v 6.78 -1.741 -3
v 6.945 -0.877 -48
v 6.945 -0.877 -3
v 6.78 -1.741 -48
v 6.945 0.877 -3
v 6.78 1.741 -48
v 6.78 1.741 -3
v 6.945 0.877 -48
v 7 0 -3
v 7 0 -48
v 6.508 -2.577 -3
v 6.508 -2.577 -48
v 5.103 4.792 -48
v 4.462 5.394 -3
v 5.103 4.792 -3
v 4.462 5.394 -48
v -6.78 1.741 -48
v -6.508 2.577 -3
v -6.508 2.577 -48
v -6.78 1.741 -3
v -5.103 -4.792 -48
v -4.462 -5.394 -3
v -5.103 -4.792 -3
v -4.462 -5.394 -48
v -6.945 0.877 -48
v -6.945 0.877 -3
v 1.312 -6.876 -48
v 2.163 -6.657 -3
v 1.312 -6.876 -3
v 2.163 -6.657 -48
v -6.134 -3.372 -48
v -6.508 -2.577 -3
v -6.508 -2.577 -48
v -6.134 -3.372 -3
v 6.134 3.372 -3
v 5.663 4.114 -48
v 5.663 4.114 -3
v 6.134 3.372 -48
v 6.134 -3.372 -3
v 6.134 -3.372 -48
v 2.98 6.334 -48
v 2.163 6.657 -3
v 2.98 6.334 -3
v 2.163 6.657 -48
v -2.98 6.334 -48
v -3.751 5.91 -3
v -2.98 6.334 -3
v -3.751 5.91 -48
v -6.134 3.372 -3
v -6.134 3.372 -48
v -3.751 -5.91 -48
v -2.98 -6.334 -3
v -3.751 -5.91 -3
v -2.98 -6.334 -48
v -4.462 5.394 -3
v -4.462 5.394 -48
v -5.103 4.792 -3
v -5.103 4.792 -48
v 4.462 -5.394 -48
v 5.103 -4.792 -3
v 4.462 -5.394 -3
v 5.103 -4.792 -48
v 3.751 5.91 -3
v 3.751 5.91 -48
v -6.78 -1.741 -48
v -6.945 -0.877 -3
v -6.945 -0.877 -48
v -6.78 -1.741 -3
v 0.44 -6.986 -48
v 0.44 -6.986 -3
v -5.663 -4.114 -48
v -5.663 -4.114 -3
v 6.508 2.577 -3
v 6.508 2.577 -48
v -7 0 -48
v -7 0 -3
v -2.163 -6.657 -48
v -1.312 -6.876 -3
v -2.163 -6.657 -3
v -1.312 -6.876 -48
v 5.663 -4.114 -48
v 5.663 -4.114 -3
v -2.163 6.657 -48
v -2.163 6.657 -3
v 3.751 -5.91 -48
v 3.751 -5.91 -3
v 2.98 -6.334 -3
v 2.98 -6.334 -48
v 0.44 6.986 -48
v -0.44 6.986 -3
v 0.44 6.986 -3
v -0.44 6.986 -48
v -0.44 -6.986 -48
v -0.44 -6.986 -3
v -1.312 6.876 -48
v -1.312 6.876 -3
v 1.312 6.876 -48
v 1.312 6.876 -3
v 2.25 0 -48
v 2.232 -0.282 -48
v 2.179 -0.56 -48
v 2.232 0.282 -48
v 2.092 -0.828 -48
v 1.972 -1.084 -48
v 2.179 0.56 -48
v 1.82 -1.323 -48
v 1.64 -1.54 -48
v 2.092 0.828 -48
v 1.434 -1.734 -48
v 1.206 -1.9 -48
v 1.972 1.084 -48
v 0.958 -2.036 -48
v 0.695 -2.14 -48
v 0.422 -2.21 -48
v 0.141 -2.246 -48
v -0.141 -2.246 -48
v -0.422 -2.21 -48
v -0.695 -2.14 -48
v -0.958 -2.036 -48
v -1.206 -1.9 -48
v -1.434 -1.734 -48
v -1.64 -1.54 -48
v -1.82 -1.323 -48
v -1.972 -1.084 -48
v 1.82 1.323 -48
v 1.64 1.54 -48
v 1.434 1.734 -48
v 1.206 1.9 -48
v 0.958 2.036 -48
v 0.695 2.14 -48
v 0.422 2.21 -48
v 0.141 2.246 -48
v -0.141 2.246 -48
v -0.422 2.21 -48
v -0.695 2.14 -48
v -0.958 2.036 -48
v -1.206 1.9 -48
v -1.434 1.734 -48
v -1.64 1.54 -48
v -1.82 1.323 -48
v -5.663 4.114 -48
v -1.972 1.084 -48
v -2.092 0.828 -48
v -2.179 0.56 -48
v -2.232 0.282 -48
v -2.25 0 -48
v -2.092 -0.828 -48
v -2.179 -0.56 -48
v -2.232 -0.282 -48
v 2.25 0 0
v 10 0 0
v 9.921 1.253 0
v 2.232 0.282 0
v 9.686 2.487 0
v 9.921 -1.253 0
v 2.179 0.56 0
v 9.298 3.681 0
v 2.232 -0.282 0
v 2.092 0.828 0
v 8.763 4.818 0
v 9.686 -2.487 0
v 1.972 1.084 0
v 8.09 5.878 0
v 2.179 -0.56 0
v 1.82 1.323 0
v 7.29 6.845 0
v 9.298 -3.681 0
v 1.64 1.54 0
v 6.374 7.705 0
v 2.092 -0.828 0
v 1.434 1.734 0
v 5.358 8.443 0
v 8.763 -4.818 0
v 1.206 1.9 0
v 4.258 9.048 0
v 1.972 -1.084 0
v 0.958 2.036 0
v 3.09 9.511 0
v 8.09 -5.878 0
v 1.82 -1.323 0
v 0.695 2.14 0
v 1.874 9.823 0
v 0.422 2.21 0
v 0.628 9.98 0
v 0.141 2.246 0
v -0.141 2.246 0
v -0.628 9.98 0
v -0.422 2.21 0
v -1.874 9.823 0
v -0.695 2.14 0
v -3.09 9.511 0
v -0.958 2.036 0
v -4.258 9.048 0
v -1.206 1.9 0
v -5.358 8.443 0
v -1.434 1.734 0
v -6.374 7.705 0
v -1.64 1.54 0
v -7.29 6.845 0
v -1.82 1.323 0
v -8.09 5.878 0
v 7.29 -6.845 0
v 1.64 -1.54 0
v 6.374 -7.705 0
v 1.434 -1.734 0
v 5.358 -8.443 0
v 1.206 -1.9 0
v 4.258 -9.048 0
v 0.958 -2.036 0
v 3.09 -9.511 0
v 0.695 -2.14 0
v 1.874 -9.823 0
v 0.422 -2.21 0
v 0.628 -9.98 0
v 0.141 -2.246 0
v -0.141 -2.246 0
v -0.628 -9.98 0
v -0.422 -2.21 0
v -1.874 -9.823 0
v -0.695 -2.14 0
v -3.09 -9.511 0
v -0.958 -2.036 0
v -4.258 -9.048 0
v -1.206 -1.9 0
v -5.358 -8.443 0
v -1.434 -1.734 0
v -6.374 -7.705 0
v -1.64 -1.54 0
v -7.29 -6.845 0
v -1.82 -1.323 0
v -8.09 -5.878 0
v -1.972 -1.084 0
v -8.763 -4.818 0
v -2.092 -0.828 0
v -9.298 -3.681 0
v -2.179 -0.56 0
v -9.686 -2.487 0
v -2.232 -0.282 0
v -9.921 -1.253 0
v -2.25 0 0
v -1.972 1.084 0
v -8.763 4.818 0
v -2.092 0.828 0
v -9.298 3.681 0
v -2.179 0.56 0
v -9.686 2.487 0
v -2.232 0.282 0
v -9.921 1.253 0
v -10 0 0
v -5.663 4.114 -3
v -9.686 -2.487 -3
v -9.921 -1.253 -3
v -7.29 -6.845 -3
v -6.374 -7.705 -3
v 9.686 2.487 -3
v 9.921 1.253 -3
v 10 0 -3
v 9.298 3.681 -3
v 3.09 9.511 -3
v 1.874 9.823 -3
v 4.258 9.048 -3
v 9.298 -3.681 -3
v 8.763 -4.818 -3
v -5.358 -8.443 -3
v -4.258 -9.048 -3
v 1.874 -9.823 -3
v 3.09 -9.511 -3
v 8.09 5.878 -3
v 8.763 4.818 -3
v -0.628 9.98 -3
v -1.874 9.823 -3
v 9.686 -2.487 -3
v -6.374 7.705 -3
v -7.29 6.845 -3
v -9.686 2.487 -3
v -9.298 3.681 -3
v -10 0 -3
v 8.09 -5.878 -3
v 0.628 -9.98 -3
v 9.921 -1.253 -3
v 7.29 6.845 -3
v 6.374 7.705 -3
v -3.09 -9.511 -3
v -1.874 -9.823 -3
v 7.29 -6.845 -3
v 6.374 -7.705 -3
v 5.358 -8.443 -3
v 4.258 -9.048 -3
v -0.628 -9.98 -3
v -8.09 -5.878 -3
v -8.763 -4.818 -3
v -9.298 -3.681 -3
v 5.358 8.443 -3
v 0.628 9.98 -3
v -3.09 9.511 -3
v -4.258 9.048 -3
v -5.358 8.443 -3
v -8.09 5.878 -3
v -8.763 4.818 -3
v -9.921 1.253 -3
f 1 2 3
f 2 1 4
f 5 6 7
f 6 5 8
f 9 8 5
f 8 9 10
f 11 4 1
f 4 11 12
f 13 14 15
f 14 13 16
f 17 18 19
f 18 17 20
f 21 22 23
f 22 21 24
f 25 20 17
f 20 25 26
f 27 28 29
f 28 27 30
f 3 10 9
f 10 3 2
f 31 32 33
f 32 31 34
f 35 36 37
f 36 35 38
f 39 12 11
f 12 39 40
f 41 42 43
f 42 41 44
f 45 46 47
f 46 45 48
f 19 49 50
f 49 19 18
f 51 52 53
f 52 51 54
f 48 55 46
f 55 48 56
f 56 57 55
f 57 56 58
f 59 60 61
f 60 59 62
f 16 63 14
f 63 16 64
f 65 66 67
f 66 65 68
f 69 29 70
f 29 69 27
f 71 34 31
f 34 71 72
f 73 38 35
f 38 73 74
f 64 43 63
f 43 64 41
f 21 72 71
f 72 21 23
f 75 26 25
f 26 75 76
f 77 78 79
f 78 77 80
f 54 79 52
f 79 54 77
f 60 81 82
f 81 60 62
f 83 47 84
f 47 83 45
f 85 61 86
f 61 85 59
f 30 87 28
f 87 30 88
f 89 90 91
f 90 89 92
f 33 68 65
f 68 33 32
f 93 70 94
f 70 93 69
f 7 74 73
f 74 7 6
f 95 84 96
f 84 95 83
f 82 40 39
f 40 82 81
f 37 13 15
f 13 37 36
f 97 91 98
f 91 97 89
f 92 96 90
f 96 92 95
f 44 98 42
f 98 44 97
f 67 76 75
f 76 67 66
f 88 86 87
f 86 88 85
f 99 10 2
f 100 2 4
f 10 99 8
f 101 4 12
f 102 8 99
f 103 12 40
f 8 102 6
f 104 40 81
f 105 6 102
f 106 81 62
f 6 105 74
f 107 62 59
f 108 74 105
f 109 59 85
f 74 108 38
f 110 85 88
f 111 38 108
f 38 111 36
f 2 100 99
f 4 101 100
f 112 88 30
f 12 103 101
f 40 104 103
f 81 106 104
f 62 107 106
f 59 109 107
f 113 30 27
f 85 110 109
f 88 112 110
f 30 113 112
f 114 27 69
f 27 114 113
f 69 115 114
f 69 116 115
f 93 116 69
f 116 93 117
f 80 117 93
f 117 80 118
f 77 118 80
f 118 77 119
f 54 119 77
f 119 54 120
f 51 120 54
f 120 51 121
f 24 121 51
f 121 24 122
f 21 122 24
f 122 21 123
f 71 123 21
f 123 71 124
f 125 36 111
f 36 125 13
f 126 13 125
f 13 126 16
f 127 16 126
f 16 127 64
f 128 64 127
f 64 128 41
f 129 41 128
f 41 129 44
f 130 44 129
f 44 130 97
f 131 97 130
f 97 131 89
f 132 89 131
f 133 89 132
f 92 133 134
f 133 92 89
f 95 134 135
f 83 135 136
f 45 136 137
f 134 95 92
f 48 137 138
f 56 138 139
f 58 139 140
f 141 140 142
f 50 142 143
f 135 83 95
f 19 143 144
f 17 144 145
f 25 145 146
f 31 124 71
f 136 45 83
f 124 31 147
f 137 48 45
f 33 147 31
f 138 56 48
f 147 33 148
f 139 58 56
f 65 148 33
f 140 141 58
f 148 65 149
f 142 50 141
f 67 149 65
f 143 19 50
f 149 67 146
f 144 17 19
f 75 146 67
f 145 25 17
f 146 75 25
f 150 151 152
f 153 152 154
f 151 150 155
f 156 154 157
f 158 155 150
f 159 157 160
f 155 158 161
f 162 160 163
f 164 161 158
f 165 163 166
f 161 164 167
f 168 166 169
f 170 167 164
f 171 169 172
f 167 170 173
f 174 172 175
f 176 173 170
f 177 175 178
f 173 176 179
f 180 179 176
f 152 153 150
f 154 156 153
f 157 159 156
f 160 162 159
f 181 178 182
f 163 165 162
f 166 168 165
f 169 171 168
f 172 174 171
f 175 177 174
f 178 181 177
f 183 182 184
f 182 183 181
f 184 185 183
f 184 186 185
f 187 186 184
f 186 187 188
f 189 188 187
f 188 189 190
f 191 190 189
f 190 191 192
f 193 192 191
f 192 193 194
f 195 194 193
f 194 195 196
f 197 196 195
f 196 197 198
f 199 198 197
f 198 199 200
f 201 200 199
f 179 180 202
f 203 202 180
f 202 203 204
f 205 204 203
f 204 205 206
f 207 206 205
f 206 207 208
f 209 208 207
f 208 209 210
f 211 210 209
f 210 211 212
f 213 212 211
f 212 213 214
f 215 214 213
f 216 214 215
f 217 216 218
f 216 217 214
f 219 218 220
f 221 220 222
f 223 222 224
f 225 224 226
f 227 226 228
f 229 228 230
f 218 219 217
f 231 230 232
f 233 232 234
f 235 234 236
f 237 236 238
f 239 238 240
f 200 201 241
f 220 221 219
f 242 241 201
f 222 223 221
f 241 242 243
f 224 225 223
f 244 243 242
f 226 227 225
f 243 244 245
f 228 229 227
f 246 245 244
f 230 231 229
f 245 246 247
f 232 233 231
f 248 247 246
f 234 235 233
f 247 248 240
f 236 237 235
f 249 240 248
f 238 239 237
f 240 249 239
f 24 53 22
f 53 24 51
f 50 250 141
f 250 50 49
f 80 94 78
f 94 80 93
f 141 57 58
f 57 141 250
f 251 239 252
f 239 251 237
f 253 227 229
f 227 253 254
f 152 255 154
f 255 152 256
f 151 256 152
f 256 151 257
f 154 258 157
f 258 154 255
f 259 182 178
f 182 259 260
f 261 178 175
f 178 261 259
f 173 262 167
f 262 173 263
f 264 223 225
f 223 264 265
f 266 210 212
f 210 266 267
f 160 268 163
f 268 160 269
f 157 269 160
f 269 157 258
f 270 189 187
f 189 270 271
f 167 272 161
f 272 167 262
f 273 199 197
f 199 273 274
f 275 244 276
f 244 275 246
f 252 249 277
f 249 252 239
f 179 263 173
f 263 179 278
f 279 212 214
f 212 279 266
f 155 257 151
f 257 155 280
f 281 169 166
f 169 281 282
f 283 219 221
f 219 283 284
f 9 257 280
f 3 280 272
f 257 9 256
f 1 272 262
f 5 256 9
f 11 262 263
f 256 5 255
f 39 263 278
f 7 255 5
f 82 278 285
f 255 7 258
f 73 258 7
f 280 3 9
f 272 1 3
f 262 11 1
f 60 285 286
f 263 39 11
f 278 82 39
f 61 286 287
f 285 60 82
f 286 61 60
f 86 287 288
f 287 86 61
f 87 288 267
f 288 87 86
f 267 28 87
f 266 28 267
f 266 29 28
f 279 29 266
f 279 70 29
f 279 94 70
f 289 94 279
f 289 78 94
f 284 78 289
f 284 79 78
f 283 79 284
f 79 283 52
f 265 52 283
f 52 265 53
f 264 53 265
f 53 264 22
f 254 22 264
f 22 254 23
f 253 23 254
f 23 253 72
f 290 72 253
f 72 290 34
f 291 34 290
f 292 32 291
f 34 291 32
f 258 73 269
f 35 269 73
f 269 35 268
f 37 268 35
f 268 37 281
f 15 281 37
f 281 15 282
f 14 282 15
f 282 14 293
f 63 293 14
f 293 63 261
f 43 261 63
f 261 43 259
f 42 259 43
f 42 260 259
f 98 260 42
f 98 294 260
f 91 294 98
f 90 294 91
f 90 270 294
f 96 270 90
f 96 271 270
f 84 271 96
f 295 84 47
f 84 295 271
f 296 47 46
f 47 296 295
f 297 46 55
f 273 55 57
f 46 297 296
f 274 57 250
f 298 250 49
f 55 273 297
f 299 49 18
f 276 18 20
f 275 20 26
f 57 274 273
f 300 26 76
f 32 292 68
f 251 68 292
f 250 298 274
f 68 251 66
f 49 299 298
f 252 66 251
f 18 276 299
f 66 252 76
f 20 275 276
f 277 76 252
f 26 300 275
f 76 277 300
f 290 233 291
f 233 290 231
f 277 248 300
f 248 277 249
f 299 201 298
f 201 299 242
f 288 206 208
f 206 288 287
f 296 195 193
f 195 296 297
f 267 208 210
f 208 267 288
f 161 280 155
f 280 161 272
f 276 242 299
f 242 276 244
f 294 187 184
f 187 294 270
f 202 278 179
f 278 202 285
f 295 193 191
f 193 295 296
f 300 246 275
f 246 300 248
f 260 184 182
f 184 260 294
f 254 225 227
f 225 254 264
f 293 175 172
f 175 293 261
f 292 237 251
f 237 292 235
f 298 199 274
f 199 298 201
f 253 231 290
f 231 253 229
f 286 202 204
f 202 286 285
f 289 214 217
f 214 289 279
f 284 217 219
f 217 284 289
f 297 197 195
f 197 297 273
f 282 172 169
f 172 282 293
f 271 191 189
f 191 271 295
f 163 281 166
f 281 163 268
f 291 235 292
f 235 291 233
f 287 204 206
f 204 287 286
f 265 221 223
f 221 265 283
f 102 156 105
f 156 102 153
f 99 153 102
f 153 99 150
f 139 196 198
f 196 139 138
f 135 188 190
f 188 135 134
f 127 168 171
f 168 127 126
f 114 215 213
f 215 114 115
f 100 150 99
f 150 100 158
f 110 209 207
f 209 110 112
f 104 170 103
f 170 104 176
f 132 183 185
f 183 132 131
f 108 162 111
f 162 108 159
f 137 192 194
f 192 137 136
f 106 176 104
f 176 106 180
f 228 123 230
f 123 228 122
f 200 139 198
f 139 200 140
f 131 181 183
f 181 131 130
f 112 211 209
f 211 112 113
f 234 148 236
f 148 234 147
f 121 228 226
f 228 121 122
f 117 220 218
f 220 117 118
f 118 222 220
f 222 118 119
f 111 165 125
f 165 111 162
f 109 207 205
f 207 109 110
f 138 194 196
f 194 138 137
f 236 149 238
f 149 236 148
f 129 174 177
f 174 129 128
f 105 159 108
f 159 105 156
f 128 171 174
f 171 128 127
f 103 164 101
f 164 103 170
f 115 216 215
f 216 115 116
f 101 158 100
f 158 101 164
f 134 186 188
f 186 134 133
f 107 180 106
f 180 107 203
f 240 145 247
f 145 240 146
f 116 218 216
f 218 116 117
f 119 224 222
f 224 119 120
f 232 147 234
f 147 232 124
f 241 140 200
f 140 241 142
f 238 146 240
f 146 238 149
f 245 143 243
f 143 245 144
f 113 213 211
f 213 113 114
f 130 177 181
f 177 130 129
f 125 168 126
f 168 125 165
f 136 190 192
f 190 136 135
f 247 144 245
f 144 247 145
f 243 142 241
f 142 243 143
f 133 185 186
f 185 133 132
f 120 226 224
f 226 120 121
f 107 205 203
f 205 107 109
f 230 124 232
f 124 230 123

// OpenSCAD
$fn = 50;


difference() {
	union() {
		translate(v = [0, 0, -48.0000000000]) {
			cylinder(h = 48, r = 7.0000000000);
		}
		translate(v = [0, 0, -3.0000000000]) {
			cylinder(h = 3, r = 10.0000000000);
		}
	}
	union() {
		#translate(v = [0, 0, -48]) {
			cylinder(h = 48, r = 2.2500000000);
		}
	}
}
